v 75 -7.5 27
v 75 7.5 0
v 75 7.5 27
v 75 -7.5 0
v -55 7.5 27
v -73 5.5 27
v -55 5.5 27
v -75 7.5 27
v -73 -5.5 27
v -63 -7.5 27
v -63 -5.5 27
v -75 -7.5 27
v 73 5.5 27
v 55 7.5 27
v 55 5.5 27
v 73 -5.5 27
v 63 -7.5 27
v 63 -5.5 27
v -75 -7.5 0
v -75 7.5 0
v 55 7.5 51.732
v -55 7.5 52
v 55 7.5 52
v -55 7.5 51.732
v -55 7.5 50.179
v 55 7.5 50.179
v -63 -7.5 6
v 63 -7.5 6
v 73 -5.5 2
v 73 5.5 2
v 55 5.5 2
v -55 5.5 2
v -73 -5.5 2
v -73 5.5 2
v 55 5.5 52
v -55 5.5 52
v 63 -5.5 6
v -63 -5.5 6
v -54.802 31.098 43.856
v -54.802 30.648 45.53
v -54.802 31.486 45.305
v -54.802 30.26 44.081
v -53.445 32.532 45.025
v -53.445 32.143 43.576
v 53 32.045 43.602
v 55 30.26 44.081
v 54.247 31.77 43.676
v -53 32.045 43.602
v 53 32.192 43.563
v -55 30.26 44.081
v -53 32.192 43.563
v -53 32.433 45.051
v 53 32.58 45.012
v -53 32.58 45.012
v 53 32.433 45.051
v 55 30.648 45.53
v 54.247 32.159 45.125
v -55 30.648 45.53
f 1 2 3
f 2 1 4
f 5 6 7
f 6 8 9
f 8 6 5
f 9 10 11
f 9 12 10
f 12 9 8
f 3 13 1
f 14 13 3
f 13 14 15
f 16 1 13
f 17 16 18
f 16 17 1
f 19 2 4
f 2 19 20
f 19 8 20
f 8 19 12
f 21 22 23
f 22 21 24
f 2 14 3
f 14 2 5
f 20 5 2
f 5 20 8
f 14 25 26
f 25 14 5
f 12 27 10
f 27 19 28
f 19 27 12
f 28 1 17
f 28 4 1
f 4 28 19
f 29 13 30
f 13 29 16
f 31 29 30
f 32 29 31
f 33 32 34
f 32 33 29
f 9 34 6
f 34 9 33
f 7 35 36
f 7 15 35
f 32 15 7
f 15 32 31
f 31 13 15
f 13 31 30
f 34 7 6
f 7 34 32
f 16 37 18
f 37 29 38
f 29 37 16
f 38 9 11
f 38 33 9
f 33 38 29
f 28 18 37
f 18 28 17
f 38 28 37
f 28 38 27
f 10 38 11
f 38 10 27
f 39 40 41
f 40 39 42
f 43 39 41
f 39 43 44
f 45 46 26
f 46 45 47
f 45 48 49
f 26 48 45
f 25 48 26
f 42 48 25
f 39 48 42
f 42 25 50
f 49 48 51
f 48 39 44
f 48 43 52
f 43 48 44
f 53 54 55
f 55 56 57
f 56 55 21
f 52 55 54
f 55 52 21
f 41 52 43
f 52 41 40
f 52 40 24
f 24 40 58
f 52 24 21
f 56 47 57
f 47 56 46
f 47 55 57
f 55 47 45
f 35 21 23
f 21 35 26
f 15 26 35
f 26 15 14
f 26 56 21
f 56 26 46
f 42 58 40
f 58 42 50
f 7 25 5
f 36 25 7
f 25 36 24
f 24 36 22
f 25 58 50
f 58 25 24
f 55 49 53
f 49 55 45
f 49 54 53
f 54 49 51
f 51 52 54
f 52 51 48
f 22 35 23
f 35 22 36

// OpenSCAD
// CD Slot Smartphone holder

Smartphone_length = 146;
Smartphone_depth = 11;
Smartphone_frame_left_right = 10;
Smartphone_frame_bottom = 4;
Smartphone_height_button = 25;
CD_slot_angle = 15;
CD_slot_height= 52;
CD_slot_depth = 25;

union() {
    difference() {
        translate([-(Smartphone_length+4)/2,-(Smartphone_depth+4)/2,0]) {
            cube([Smartphone_length+4,Smartphone_depth+4,Smartphone_height_button+2]);
        }
        translate([-Smartphone_length/2,-Smartphone_depth/2,2]) {
            cube([Smartphone_length,Smartphone_depth,Smartphone_height_button+2]);
        }
        translate([-(Smartphone_length-2*Smartphone_frame_left_right)/2,-10,Smartphone_frame_bottom+2]) {
            cube([Smartphone_length-2*Smartphone_frame_left_right,10,Smartphone_height_button]);
        }
    }

    translate([-110/2,(Smartphone_depth)/2,0]) {
        cube([110,2,CD_slot_height]);
    }

    translate([-110/2,(Smartphone_depth+2)/2,CD_slot_height]) {
        rotate([-90-CD_slot_angle,0,0]) {
            union() {
                translate([2,0,CD_slot_depth]) {
                    rotate([-90,0,0]) {
                        cylinder(1.5,2,2);
                    }
                }
                translate([110-2,0,CD_slot_depth]) {
                    rotate([-90,0,0]) {
                        cylinder(1.5,2,2);
                    }
                }
                cube([110,1.5,CD_slot_depth]);
                translate([2,0,CD_slot_depth]) {
                    cube([110-4,1.5,2]);
                }
            }
        }
    }
}
